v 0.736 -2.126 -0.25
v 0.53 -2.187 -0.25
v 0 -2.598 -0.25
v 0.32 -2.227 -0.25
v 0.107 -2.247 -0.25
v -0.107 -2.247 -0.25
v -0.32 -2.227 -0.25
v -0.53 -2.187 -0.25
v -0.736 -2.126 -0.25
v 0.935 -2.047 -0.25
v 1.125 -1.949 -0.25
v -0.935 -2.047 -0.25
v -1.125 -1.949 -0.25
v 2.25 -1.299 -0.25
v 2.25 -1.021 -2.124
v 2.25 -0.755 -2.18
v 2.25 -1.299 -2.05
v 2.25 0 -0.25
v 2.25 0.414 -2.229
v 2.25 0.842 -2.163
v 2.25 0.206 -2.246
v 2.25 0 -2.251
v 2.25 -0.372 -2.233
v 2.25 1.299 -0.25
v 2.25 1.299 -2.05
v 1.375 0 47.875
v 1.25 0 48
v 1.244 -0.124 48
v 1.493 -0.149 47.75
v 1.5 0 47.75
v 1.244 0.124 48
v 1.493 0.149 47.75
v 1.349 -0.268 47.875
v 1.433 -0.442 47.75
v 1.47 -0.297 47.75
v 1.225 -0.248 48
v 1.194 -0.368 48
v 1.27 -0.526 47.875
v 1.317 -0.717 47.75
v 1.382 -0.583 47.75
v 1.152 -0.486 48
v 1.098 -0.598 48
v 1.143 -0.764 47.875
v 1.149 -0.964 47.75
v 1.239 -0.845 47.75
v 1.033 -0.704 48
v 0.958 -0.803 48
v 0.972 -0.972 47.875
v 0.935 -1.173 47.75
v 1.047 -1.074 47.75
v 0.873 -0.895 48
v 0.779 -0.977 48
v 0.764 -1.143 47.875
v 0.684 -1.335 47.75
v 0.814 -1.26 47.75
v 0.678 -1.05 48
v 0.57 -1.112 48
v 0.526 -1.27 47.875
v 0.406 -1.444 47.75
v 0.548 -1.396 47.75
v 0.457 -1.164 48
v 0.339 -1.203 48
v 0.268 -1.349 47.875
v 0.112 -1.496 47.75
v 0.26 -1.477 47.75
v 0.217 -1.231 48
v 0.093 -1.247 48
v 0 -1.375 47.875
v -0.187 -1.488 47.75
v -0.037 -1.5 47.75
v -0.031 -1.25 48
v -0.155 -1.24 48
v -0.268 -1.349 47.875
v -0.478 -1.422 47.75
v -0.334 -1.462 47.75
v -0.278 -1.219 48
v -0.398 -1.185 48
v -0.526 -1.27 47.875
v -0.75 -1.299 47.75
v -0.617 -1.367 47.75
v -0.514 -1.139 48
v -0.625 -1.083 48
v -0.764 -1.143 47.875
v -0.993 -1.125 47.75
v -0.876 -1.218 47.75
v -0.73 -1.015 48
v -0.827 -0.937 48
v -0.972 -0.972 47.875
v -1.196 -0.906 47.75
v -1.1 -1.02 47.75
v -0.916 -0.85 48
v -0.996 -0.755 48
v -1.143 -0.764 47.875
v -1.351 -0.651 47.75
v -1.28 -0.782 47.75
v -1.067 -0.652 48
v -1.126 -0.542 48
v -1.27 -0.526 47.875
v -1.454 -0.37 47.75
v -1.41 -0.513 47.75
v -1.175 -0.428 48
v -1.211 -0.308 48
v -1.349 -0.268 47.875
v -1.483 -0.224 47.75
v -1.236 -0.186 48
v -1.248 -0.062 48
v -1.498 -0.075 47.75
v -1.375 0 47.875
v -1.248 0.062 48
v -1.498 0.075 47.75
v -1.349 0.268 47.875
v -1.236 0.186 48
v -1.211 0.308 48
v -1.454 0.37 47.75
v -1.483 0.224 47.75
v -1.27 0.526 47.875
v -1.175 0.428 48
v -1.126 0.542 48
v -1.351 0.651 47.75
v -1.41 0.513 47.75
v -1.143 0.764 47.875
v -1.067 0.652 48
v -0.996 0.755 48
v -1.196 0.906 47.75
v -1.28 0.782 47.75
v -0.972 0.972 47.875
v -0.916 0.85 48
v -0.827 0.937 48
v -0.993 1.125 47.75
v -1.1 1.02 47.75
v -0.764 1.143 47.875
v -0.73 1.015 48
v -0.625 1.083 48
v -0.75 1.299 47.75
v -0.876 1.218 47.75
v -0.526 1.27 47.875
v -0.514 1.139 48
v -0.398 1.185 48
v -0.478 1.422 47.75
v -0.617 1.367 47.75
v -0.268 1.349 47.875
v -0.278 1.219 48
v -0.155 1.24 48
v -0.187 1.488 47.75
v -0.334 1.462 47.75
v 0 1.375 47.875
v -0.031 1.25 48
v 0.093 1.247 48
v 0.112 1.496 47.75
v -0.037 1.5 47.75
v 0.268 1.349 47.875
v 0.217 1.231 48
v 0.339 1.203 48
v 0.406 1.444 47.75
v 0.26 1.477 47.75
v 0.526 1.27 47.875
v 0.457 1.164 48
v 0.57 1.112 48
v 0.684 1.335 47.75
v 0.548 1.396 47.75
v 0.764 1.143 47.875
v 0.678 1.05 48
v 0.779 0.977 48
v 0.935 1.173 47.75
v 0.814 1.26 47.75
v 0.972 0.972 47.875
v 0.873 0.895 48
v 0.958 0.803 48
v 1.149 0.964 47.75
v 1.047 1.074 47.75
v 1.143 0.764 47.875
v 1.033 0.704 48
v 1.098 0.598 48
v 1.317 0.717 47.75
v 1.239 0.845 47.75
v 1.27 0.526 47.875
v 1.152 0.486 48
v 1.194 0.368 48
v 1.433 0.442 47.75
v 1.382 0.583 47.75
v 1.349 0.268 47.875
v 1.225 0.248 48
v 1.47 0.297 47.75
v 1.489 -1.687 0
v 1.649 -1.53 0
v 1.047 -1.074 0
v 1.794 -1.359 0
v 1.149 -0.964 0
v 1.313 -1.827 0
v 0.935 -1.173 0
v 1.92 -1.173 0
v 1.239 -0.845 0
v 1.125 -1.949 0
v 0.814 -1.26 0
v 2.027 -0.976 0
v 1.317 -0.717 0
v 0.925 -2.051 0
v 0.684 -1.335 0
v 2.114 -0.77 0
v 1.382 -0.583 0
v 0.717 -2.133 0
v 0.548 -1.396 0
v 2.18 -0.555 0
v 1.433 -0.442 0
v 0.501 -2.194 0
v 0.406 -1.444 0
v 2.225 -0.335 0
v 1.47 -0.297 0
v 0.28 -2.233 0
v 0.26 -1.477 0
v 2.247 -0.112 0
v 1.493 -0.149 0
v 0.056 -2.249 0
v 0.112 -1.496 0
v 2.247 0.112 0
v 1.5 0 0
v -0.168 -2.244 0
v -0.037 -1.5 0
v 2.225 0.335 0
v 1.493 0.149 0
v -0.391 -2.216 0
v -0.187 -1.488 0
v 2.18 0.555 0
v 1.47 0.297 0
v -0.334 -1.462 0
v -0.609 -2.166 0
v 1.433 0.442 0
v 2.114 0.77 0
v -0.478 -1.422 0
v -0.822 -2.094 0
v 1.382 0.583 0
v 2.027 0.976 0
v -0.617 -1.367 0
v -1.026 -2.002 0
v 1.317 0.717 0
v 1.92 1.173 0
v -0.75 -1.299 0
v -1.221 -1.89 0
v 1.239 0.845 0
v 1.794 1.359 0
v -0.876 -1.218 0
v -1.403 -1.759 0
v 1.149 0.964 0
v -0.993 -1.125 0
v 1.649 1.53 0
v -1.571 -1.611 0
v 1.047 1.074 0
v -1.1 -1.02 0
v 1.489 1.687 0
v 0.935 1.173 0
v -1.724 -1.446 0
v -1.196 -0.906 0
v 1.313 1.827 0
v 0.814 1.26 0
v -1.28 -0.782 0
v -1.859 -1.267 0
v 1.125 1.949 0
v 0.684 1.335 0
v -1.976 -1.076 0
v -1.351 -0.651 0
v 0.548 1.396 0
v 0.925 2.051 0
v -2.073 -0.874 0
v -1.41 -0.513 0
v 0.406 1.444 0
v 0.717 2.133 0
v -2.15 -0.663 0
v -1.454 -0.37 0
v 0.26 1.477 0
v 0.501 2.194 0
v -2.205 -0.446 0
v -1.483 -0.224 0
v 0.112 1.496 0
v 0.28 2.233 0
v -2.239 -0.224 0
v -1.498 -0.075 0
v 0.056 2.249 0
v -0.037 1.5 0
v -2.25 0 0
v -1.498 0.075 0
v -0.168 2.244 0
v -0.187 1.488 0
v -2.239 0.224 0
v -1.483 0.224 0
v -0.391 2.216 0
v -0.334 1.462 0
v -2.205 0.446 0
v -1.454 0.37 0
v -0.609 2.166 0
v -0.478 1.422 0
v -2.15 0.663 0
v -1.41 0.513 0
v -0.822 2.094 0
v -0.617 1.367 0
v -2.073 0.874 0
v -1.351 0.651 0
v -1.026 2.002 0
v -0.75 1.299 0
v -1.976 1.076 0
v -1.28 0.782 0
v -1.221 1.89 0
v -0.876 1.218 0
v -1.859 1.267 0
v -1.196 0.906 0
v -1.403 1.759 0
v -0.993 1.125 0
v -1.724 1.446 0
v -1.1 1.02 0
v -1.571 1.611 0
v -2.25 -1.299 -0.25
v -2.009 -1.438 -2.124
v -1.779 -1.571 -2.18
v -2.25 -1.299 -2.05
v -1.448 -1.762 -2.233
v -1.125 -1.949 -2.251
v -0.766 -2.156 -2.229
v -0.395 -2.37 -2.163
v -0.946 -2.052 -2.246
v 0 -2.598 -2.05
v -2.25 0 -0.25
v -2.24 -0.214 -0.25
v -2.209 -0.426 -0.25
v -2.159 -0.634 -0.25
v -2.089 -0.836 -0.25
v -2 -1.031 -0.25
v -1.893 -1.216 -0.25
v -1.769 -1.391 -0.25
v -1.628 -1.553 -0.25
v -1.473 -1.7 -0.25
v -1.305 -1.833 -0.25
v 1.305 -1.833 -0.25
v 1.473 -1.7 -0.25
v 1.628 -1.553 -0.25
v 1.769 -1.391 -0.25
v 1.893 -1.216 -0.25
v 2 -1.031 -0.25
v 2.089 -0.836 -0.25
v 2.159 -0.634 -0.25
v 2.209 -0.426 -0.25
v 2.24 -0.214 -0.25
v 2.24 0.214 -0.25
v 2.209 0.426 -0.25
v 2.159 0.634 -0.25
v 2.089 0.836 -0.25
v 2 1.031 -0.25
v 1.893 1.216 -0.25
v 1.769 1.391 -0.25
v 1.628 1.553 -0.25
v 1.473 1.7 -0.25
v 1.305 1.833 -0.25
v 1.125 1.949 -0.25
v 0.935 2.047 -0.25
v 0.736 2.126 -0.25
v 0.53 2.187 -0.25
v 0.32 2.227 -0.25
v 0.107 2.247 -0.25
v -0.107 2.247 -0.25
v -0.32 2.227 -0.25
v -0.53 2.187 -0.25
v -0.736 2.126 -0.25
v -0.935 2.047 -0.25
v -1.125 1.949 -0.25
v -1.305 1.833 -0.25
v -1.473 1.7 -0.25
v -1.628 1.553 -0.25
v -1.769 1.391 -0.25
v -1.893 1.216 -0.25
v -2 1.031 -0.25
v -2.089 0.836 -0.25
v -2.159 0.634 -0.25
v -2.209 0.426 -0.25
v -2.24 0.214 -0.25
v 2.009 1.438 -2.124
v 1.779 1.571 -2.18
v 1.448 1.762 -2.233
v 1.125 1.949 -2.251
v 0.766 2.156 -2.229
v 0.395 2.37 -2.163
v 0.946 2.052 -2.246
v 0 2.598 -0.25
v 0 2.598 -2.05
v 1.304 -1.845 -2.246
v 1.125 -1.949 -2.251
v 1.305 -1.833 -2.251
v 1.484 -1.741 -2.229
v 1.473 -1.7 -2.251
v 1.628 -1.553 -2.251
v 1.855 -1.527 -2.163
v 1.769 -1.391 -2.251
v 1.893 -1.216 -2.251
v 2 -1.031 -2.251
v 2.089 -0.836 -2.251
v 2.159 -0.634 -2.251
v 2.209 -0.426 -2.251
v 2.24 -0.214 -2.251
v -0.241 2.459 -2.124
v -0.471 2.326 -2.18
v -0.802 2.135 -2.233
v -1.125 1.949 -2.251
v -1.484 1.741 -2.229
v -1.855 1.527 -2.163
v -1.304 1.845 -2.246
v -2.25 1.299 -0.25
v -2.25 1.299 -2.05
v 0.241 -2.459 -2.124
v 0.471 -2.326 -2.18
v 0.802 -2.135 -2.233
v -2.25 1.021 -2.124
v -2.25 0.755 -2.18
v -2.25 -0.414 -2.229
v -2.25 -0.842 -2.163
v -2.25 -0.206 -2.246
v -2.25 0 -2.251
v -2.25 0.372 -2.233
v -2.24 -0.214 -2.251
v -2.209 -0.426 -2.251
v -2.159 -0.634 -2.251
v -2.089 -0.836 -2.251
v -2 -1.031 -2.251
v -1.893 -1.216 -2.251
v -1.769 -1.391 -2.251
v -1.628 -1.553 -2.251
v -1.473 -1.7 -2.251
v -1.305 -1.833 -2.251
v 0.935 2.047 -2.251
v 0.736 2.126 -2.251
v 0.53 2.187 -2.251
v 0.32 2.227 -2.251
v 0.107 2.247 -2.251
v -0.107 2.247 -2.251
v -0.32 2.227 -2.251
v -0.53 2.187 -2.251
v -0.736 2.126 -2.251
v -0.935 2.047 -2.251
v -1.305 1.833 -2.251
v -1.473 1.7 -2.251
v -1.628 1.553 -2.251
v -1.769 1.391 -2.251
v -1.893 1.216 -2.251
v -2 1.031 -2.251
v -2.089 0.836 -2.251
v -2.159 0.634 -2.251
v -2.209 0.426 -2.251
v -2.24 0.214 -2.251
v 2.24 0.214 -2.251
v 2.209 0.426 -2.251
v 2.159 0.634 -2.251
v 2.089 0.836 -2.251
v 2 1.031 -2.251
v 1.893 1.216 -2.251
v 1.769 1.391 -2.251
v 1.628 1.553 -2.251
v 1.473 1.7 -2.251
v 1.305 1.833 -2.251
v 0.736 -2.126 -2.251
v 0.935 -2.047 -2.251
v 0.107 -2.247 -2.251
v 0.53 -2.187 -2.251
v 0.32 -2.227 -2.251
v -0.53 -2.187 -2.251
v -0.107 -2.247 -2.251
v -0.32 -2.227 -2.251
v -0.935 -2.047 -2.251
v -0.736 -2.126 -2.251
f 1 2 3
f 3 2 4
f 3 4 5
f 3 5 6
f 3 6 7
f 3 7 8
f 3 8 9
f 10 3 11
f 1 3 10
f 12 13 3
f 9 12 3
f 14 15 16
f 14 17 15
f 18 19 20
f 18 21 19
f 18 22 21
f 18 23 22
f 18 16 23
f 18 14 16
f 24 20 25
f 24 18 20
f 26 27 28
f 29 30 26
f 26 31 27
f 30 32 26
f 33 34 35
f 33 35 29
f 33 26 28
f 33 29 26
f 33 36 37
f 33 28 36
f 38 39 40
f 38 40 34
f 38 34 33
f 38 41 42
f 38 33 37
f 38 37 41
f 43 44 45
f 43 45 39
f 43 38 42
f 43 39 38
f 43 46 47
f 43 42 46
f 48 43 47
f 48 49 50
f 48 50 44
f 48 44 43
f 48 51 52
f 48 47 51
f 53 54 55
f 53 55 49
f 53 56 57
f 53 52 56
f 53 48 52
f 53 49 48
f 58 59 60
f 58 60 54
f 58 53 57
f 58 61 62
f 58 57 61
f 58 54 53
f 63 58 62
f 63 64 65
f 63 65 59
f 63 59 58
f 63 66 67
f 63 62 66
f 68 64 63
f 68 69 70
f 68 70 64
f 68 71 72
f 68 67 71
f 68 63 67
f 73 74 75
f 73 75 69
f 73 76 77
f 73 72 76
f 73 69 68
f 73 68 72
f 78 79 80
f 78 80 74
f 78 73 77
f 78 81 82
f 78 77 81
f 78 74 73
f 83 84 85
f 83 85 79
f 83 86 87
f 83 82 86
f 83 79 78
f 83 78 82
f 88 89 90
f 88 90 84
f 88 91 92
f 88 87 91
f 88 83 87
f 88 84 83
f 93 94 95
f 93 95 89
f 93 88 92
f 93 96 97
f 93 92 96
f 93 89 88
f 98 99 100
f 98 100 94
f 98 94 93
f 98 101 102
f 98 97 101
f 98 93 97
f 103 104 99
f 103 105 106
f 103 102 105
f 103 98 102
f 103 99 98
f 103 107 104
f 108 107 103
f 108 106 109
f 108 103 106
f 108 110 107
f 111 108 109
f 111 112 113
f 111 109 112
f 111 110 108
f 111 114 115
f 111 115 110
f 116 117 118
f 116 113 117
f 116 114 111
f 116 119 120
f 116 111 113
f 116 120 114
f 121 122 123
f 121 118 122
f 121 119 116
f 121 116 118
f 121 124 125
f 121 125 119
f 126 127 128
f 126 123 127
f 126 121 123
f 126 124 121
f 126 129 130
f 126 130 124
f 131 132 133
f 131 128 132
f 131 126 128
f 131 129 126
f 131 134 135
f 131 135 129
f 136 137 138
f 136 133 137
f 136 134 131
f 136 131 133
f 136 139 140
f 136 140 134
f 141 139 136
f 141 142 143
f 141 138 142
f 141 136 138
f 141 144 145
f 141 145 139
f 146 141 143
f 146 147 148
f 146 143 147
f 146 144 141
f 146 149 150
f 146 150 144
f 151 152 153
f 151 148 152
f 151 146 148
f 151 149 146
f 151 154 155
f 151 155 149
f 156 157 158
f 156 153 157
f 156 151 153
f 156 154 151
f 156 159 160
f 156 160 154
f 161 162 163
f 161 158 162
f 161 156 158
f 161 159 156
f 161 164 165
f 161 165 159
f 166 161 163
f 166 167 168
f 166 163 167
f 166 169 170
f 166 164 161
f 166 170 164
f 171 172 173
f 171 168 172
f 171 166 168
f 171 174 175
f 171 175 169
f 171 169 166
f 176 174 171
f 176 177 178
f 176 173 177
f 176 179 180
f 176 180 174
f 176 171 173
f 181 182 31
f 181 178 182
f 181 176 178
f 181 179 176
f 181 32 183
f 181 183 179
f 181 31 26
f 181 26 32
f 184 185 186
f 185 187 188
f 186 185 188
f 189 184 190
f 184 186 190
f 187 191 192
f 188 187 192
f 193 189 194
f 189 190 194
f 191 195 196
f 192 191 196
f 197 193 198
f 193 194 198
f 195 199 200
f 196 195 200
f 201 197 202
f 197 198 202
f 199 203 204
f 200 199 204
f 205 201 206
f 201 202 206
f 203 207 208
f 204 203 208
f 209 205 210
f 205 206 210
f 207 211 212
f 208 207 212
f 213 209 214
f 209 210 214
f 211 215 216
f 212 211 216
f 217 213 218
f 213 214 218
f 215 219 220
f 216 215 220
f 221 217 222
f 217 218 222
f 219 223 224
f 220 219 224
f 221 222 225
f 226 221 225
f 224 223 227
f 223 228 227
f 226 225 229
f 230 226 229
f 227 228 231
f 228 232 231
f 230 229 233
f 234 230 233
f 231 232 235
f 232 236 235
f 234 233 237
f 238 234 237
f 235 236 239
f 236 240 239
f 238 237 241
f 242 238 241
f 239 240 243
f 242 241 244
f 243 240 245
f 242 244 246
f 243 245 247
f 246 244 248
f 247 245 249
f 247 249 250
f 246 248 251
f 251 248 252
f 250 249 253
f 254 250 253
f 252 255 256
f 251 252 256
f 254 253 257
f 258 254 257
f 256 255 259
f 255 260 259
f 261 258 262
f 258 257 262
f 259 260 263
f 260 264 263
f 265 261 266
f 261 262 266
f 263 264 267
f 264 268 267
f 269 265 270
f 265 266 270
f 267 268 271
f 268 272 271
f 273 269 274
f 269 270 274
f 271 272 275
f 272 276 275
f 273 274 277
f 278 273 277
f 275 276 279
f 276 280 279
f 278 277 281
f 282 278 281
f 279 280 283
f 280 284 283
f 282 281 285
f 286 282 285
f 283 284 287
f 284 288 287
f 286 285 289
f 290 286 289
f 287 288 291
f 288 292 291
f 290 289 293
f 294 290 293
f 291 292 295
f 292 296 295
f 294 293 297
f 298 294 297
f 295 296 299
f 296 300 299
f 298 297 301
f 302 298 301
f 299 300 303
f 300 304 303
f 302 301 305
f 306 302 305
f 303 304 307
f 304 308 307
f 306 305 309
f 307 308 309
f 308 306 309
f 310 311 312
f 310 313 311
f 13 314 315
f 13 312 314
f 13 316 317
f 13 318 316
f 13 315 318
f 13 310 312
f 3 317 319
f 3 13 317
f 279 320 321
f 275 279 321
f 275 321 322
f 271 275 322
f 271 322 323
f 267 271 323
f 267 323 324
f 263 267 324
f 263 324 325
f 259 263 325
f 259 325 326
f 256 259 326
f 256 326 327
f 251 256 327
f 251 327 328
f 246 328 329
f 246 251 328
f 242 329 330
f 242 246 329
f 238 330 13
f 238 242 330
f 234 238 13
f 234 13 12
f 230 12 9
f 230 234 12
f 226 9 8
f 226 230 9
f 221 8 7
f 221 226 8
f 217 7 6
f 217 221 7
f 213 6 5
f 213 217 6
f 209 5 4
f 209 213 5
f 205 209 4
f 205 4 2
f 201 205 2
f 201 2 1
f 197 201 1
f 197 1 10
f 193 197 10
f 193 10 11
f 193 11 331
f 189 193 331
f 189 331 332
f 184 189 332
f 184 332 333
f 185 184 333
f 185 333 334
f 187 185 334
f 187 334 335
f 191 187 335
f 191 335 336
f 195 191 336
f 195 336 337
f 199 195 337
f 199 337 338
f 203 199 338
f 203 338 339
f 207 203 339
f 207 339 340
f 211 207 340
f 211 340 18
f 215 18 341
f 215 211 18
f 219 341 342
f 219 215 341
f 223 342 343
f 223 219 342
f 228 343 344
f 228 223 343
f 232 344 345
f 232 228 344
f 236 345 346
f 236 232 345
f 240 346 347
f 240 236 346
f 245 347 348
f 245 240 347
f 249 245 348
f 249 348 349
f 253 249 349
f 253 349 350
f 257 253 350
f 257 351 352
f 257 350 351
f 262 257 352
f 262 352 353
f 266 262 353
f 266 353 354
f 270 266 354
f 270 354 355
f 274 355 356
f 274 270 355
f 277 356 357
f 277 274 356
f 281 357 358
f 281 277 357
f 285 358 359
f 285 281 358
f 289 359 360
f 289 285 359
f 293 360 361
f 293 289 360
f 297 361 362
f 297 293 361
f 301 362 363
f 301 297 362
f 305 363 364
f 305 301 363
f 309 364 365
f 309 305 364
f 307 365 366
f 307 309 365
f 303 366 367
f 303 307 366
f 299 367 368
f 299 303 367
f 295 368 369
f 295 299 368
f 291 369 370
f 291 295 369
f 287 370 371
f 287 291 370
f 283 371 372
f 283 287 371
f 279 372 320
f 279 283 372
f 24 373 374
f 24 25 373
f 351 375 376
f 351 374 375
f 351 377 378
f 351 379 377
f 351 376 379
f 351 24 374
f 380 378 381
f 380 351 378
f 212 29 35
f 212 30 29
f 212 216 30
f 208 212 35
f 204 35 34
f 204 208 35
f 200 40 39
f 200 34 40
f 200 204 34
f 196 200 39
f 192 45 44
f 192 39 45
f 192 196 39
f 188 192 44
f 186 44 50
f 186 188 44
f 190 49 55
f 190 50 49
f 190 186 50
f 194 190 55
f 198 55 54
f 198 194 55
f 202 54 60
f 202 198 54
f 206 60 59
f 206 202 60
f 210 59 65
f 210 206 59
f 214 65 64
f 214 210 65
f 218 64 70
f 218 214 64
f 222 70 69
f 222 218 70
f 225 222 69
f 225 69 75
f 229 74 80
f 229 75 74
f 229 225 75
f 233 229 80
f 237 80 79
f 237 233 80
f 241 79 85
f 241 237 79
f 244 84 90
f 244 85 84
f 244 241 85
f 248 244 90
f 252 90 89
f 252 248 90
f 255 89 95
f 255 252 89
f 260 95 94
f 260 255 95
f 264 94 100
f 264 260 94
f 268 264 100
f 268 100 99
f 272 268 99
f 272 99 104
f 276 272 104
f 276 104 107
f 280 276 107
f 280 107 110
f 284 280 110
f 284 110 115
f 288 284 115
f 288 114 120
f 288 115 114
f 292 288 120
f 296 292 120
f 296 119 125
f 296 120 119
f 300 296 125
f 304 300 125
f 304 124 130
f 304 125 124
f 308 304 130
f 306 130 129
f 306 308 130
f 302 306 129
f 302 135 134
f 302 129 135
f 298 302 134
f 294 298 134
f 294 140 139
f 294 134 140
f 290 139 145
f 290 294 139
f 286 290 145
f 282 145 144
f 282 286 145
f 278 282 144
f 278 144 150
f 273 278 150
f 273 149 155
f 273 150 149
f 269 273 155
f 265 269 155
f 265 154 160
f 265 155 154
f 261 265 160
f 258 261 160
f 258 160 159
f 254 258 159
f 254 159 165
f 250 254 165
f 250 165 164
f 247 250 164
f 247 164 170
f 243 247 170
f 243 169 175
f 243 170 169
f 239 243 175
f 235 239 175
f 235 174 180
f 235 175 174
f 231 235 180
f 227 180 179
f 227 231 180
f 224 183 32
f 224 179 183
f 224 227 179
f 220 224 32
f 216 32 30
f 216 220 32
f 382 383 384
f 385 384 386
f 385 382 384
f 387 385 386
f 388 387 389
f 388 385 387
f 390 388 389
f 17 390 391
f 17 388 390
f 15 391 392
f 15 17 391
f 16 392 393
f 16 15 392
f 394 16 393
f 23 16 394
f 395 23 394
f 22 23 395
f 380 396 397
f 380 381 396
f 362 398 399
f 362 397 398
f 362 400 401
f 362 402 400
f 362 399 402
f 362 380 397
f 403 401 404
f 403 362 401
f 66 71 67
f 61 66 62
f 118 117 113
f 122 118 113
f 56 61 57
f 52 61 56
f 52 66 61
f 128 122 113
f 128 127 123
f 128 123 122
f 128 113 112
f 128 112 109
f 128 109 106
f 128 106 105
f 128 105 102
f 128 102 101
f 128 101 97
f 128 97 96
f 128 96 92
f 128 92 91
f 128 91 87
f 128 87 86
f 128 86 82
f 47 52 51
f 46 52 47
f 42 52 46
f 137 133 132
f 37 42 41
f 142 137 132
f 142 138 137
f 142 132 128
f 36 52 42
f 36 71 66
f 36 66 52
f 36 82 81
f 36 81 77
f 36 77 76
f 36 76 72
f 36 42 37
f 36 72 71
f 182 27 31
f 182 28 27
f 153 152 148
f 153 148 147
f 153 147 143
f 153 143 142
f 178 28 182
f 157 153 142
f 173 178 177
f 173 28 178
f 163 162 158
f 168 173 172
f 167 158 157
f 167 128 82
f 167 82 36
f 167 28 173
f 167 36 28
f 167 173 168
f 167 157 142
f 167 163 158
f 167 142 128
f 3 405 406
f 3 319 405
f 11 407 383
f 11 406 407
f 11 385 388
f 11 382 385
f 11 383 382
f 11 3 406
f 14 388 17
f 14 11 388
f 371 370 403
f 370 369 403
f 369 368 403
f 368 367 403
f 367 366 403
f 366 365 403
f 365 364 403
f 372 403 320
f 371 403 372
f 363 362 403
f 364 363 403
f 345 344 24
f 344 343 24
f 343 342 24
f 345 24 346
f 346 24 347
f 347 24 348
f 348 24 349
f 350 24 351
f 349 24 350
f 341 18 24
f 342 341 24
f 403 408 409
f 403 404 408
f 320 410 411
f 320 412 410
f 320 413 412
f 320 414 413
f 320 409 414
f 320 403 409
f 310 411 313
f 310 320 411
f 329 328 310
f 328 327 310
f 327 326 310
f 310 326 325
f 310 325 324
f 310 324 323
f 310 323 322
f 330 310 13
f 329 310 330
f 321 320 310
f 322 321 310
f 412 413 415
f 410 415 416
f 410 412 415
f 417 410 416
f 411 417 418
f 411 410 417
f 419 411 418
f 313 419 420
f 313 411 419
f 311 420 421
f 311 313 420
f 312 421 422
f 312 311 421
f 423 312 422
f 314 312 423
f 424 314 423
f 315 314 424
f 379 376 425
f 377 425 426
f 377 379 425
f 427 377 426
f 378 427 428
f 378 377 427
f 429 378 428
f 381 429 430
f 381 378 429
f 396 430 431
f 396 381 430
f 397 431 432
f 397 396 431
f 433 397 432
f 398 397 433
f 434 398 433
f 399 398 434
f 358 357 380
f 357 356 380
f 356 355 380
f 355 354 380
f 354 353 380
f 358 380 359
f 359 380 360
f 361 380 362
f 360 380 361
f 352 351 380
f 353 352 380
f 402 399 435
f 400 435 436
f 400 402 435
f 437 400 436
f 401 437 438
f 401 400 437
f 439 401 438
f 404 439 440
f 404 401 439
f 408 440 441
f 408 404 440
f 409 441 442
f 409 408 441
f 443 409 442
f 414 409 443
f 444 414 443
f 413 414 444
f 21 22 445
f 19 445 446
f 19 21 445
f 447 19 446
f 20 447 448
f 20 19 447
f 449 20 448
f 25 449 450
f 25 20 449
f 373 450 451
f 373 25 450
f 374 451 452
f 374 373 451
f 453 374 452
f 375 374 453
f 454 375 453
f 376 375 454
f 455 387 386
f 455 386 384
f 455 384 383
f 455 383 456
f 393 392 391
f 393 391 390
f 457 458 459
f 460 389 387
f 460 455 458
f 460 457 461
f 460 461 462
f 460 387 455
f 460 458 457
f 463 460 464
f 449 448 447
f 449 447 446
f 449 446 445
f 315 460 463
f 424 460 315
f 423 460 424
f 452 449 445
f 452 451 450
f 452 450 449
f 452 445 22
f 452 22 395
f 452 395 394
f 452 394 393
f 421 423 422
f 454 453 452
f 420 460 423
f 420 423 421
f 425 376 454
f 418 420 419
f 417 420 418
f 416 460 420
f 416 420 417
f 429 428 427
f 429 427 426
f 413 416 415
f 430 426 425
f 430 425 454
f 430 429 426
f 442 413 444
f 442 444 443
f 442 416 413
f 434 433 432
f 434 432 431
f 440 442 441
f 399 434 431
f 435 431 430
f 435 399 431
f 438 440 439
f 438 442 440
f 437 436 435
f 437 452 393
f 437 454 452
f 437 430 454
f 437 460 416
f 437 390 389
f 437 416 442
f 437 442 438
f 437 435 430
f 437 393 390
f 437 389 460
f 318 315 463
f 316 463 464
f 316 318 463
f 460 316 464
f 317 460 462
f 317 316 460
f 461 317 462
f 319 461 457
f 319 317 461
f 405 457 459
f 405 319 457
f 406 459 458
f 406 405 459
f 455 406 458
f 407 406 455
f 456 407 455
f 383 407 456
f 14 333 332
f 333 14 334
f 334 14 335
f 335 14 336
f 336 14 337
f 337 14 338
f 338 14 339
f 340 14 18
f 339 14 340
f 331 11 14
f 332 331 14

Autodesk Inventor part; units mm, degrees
ref_plane "YZ Plane" through (0, 0, 0) normal (1, 0, 0) x (0, 1, 0)
ref_plane "XZ Plane" through (0, 0, 0) normal (0, 1, 0) x (-1, 0, 0)
ref_plane "XY Plane" through (0, 0, 0) normal (0, 0, 1) x (1, 0, 0)
sketch "Sketch1" plane through (0, 0, 0) normal (0, 0, 1) x (1, 0, 0)
  circle A0 centre (0, 0) radius 1.5
  dimension "Diameter" = 3
extrude "Extrusion1" add sketch "Sketch1" along normal blind 48
sketch "Sketch2" plane through (0, 0, 0) normal (0, 0, -1) x (-1, 0, 0)
  circle A0 centre (0, 0) radius 1.5 construction
  circle A1 centre (0, 0) radius 2.25
  dimension "Head_Washer_Diameter" = 4.5
extrude "Extrusion2" add sketch "Sketch2" along normal blind 0.25
sketch "Sketch3" plane through (0, 0, -0.25) normal (0, 0, -1) x (-1, 0, 0)
  circle A0 centre (0, 0) radius 2.25 construction
  line L0 (-2.25, 1.299) -> (0, 2.5981)
  line L1 (0, 2.5981) -> (2.25, 1.299)
  line L2 (2.25, 1.299) -> (2.25, -1.299)
  line L3 (2.25, -1.299) -> (0, -2.5981)
  line L4 (0, -2.5981) -> (-2.25, -1.299)
  line L5 (-2.25, -1.299) -> (-2.25, 1.299)
extrude "Extrusion3" add sketch "Sketch3" along normal blind 2.001
thread "Thread1" size "M3x0.5" class "6g" standard "ANSI Metric M Profile" length 10
chamfer "Chamfer1" distance 0.25 angle 45 1 edges at (-1.5, 0, 48)
sketch "Sketch4" plane through (0, 0, 0) normal (0, 1, 0) x (-1, 0, 0)
  line L0 (-2.25, -0.25) -> (-2.25, -2.251) construction
  line L1 (-2.25, -0.25) -> (-2.25, -2.251) construction
  line L2 (-2.25, -2.251) -> (-3.45, -2.251)
  line L3 (-3.45, -2.251) -> (-3.45, -1.5582)
  line L4 (-3.45, -1.5582) -> (-2.25, -2.251)
  line L5 (0, 0) -> (0, -6.83)
  point P0 (-2.25, -0.25)
  dimension "Head_Chamfer_Angle" = 30
  dimension "d14" = 1.2
revolve "Revolution1" cut sketch "Sketch4" angle 360 about axis through (0, 0, 0) along (0, 0, -1)
equation "\"Head_Washer_Diameter\" = 1.5 * Diameter"
equation "\"Head_Height\" = 0.667 * Diameter"
equation "\"d14\" = 0.4 * Diameter"
properties part number "Hex Head Cap Screw"
